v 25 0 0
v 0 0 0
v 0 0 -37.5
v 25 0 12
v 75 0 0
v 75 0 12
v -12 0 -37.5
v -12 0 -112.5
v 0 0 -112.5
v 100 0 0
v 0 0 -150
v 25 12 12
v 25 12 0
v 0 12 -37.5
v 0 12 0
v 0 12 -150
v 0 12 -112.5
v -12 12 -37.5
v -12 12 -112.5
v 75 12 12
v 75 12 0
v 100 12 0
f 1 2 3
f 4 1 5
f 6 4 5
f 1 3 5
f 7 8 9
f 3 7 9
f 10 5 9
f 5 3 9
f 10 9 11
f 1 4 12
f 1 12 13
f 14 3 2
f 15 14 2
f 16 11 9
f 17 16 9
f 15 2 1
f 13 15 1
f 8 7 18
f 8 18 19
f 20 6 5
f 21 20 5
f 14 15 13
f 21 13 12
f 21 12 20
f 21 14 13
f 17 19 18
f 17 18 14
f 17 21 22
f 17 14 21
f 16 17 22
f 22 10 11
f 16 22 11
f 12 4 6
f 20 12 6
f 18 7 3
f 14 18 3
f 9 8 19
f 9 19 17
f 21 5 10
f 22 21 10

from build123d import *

# Parameters (mm, degrees)
SKETCH1_W           = 12
SKETCH1_H           = 75
SKETCH1_W_2         = 50
SKETCH1_H_2         = 12
BOSS_EXTRUDE1_DEPTH = 12


with BuildPart() as part:
    # Sketch1 → Boss-Extrude1 (new body)
    with BuildSketch(Plane(origin=(0, 0, 0), x_dir=(1, 0, 0), z_dir=(0, 1, 0))):
        with Locations((-6, 75)):
            Rectangle(SKETCH1_W, SKETCH1_H)
        Polygon((0, 37.5), (0, 0), (25, 0), (25, 12), (75, 12), (75, 0), (100, 0), (0, 150), (0, 112.5), (12, 112.5), (12, 37.5), align=None)
        with Locations((50, -6)):
            Rectangle(SKETCH1_W_2, SKETCH1_H_2)
        with Locations((50, 6)):
            Rectangle(SKETCH1_W_2, SKETCH1_H_2)
        with Locations((6, 75)):
            Rectangle(SKETCH1_W, SKETCH1_H)
    extrude(amount=BOSS_EXTRUDE1_DEPTH)


solid = part.part
